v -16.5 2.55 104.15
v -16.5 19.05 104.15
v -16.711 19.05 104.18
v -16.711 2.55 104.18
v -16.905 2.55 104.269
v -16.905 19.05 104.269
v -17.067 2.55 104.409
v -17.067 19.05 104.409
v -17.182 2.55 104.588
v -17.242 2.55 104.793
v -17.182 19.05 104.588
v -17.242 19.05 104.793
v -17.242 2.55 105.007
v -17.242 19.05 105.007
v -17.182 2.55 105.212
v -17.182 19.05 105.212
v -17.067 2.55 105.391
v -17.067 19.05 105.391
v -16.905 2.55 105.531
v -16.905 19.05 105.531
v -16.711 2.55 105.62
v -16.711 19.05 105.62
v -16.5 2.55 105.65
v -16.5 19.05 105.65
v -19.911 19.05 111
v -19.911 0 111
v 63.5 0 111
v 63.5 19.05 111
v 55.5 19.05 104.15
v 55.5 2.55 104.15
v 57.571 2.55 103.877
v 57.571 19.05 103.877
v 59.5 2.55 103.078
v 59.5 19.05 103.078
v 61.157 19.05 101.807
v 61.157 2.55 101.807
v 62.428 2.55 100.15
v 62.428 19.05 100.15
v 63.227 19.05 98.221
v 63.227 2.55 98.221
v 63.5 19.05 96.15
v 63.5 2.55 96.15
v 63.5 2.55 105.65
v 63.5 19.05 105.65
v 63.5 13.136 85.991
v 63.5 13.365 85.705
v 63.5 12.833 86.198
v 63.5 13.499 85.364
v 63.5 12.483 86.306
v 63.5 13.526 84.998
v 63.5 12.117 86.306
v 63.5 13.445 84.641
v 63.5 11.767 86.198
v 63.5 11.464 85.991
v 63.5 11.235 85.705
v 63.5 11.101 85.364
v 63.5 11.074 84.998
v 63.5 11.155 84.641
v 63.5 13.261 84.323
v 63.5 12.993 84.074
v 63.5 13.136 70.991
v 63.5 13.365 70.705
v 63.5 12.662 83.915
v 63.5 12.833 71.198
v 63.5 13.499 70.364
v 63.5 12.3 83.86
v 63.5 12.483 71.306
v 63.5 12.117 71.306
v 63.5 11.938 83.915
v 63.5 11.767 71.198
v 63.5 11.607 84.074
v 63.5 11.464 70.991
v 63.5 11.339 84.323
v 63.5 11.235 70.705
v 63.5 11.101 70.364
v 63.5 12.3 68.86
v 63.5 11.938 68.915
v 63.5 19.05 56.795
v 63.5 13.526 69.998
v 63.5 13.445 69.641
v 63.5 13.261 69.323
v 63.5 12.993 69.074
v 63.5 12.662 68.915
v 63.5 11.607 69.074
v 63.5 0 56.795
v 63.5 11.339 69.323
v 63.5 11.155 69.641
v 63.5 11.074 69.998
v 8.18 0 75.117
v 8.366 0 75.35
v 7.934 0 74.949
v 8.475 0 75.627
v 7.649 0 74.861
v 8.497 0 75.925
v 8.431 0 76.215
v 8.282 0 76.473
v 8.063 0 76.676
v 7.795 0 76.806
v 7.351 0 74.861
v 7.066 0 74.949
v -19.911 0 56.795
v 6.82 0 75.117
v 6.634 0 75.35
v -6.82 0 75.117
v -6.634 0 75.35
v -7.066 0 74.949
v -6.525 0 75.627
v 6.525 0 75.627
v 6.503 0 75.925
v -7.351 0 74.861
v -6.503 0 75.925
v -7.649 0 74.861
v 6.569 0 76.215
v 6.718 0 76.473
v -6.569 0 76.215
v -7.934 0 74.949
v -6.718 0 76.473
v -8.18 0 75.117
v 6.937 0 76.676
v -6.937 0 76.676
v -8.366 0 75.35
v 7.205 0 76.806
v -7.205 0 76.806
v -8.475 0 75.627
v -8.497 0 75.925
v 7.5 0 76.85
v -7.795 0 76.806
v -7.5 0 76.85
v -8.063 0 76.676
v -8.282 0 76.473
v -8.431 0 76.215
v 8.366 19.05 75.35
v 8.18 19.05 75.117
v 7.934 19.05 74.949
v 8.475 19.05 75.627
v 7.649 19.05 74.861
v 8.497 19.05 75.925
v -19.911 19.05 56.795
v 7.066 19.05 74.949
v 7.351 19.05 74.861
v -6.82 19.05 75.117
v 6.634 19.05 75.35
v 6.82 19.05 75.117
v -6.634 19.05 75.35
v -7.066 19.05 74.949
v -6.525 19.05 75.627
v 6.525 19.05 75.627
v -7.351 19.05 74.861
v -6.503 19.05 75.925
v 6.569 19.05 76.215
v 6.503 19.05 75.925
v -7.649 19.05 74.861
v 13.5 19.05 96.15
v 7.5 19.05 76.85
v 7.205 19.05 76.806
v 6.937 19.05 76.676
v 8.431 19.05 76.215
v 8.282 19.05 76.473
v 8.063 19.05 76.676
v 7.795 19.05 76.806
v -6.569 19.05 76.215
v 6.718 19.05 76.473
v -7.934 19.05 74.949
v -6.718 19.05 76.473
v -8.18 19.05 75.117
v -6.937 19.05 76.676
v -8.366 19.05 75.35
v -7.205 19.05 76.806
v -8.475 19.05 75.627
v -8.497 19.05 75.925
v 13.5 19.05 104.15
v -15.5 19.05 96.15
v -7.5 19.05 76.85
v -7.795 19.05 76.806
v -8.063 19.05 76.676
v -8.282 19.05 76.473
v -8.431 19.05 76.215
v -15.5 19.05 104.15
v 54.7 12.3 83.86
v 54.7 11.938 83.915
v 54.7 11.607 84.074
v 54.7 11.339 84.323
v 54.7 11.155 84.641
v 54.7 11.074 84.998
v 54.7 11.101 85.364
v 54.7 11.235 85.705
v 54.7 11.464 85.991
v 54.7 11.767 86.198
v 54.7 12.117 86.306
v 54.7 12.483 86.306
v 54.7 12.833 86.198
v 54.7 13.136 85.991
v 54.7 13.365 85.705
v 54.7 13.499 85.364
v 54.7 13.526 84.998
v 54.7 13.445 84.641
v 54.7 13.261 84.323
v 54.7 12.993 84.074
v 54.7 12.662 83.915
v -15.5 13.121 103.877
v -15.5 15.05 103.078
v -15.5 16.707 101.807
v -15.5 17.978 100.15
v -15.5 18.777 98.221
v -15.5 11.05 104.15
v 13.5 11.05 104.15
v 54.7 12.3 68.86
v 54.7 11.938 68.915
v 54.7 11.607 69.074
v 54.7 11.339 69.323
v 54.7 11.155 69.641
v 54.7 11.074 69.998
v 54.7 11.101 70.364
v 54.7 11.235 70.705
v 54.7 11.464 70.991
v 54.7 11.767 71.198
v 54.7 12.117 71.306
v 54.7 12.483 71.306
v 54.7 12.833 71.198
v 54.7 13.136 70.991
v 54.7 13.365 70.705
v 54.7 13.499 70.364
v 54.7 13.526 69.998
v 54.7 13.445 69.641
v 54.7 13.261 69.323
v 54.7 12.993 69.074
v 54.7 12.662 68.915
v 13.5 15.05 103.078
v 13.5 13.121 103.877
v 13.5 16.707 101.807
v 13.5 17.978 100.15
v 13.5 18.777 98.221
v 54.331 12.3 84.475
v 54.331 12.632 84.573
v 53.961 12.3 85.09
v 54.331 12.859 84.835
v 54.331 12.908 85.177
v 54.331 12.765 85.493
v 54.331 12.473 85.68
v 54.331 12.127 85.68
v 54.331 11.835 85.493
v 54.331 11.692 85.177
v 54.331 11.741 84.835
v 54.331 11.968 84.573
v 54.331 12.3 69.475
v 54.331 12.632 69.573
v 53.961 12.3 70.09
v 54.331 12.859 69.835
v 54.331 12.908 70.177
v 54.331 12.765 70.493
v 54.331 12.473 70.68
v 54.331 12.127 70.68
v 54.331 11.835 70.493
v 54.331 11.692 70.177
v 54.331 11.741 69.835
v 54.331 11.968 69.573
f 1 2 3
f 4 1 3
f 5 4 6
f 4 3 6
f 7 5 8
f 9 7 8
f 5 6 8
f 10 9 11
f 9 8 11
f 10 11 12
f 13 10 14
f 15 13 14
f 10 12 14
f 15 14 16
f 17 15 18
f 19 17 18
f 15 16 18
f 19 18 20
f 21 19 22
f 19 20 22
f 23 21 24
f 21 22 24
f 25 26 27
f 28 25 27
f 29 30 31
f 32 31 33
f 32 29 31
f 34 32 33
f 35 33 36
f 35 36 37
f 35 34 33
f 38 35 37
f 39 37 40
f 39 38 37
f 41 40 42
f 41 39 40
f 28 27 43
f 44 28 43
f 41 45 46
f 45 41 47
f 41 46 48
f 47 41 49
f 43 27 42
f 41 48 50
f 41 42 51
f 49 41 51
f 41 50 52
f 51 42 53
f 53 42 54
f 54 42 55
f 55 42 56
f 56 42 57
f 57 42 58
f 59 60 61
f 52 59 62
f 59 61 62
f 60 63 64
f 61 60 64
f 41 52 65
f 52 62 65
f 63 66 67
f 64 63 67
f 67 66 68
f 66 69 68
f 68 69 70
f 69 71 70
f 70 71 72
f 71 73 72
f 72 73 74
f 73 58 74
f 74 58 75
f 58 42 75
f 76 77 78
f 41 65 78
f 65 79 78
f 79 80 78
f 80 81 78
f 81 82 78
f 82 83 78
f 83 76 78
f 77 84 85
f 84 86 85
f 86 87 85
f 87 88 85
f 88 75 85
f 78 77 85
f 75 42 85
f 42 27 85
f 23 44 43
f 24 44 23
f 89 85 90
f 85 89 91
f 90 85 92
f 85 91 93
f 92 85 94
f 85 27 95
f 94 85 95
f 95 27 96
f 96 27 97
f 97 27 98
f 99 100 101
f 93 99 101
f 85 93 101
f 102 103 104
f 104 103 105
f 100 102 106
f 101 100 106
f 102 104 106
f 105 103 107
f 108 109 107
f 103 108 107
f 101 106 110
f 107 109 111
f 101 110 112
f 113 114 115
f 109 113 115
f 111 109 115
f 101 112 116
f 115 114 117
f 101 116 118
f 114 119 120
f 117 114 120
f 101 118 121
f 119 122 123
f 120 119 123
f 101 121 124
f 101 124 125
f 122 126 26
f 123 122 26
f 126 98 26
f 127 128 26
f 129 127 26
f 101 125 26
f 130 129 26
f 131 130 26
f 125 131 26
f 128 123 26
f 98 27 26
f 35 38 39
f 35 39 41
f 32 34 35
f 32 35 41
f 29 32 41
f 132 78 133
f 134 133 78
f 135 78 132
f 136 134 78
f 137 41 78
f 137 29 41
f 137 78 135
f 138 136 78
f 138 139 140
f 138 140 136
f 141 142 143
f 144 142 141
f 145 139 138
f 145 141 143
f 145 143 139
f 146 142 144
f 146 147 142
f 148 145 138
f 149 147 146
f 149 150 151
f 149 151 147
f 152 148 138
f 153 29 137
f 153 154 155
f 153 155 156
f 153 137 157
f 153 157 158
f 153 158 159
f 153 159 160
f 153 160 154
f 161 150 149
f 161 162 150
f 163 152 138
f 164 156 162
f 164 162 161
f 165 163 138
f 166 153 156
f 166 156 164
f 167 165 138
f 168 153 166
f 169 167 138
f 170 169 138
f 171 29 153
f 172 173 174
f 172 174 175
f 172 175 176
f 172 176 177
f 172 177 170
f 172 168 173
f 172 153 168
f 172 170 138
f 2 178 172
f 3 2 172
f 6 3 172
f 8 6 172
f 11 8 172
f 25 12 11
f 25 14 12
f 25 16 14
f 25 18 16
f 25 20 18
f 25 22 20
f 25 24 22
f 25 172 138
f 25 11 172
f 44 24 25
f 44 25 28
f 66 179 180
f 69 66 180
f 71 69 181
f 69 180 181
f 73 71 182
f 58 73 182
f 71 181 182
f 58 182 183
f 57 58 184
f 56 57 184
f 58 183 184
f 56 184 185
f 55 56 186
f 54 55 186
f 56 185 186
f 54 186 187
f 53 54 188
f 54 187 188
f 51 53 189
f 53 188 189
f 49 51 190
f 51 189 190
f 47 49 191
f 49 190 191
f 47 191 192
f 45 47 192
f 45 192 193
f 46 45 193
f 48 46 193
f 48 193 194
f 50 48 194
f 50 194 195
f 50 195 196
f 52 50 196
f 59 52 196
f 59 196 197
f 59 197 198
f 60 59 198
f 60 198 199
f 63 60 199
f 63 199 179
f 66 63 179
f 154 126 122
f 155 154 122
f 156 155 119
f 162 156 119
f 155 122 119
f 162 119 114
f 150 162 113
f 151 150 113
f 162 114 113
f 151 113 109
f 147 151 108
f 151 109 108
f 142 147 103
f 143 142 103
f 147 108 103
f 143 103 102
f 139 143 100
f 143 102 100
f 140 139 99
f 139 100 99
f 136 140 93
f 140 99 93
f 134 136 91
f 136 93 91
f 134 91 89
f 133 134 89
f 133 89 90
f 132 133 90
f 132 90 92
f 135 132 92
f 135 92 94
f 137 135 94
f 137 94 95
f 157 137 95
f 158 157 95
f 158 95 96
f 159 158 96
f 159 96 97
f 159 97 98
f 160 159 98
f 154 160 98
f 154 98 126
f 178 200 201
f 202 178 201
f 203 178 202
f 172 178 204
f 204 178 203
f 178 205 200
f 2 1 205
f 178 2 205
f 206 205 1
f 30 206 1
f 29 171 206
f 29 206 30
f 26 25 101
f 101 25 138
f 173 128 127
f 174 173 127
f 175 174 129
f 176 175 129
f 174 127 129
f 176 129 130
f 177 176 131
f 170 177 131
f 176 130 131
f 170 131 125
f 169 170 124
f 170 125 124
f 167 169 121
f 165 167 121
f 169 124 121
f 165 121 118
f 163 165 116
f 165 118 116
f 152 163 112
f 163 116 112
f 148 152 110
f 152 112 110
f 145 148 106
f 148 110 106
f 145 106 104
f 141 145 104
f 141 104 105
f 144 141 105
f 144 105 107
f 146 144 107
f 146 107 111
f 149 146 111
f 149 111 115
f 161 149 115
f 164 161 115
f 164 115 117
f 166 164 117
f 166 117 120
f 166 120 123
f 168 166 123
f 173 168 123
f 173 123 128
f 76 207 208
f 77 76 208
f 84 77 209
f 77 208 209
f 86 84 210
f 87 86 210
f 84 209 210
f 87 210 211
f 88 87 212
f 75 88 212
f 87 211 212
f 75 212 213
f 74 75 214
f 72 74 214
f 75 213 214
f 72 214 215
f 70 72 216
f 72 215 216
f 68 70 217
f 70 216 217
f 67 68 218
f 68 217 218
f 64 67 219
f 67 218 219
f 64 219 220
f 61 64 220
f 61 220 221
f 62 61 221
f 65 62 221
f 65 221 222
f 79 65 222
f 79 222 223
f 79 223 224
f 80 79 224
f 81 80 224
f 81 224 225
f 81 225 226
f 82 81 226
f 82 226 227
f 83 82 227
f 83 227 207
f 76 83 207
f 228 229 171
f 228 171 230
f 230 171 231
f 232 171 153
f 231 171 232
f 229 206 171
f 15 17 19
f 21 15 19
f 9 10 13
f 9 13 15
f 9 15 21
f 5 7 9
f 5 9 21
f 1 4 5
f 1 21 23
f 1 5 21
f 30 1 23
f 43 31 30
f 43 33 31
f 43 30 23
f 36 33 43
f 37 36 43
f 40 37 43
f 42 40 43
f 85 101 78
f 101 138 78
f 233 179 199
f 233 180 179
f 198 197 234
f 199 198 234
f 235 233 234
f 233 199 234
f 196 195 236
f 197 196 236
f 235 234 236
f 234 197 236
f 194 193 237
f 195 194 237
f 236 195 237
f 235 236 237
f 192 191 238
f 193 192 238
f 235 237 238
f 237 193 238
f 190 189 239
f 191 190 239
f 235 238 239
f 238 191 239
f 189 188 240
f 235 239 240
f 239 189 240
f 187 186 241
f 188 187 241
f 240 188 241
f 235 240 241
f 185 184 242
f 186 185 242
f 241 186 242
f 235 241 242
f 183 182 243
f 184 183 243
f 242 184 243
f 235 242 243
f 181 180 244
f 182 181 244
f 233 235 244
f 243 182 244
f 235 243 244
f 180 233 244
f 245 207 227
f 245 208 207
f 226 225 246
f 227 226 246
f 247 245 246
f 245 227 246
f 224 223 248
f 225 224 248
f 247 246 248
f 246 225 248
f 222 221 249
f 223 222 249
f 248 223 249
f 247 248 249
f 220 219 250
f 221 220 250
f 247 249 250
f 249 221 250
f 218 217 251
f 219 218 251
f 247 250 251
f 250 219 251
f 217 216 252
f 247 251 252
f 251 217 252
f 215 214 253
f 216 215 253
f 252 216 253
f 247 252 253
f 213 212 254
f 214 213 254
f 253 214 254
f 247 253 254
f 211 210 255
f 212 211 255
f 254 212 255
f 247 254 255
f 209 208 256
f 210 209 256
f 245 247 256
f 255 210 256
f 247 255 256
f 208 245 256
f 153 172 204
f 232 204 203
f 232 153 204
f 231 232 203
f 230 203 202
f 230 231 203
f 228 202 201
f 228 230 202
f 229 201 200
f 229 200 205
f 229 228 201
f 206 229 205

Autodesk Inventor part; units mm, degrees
ref_plane "YZ Plane" through (0, 0, 0) normal (1, 0, 0) x (0, 1, 0)
ref_plane "XZ Plane" through (0, 0, 0) normal (0, 1, 0) x (-1, 0, 0)
ref_plane "XY Plane" through (0, 0, 0) normal (0, 0, 1) x (1, 0, 0)
sketch "Sketch1" plane through (0, 0, 0) normal (0, 1, 0) x (-1, 0, 0)
  line L0 (-63.5, -111) -> (63.5, -111)
  line L1 (63.5, -111) -> (63.5, 111)
  line L2 (63.5, 111) -> (-63.5, 111)
  line L3 (-63.5, 111) -> (-63.5, -111)
  line L4 (-63.5, -111) -> (63.5, 111) construction
  line L5 (63.5, -111) -> (-63.5, 111) construction
  point P0 (0, 0)
  dimension "d0" = 127
  dimension "d1" = 222
extrude "Extrusion1" add sketch "Sketch1" along normal blind 19.05
sketch "Sketch12" plane through (0, 19.05, 0) normal (0, 1, 0) x (1, 0, 0)
  line L0 (63.5, -111) -> (63.5, 111) projected
  line L1 (-16.5, -104.15) -> (63.5, -104.15)
  line L2 (63.5, -104.15) -> (63.5, -105.65)
  line L3 (63.5, -105.65) -> (-16.5, -105.65)
  circle A0 centre (33, -60.25) radius 1.2295 projected
  circle A1 centre (33, -47.45) radius 1.2295 projected
  arc A2 (-16.5, -104.15) -> (-16.5, -105.65) centre (-16.5, -104.9) ccw
  circle A3 centre (-33, -9.45) radius 1.2295 projected
  circle A4 centre (-33, -60.25) radius 1.2295 projected
  circle A5 centre (33, -98.25) radius 1.2295 projected
  line L4 (-16.5, -53.35) -> (63.5, -53.35)
  line L5 (63.5, -53.35) -> (63.5, -54.85)
  line L6 (63.5, -54.85) -> (-16.5, -54.85)
  arc A6 (-16.5, -53.35) -> (-16.5, -54.85) centre (-16.5, -54.1) ccw
  line L7 (-16.5, -2.55) -> (63.5, -2.55)
  line L8 (63.5, -2.55) -> (63.5, -4.05)
  line L9 (63.5, -4.05) -> (-16.5, -4.05)
  arc A7 (-16.5, -2.55) -> (-16.5, -4.05) centre (-16.5, -3.3) ccw
  line L10 (-16.5, 48.25) -> (63.5, 48.25)
  line L11 (63.5, 48.25) -> (63.5, 46.75)
  line L12 (63.5, 46.75) -> (-16.5, 46.75)
  arc A8 (-16.5, 48.25) -> (-16.5, 46.75) centre (-16.5, 47.5) ccw
  point P0 (0, 0)
  point P1 (63.5, -60.2)
  point P2 (63.5, -9.4)
  point P3 (63.5, 41.4)
  dimension "d156" = 1.5
  dimension "d157" = 12.8
  dimension "d159" = 0.75
  dimension "d160" = 80
  dimension "d161" = 50.8
  dimension "d162" = 5.9
  dimension "d165" = 50.8
extrude "Extrusion7" cut sketch "Sketch12" against normal blind 16.5 contours L3 A2 L1 L0 | L6 A6 L4 L0 | L9 A7 L7 L0 | L12 A8 L10 L0
sketch "Sketch13" plane through (63.5, 0, 111) normal (1, 0, 0) x (0, 0, -1)
  line L0 (0, 0) -> (222, 0) projected
  line L1 (0, 0) -> (0, 19.05) projected
  line L2 (56.15, 2.55) -> (56.15, 19.05) projected
  line L3 (5.35, 2.55) -> (5.35, 19.05) projected
  point P0 (111, 0)
  point P1 (25.91, 12.3)
  point P2 (40.91, 12.3)
  point P3 (0, 17.05)
  point P4 (56.65, 17.05)
  point P5 (5.85, 17.05)
  point P6 (76.71, 12.3)
  point P7 (91.71, 12.3)
  point P8 (127.51, 12.3)
  point P9 (142.51, 12.3)
  point P10 (178.31, 12.3)
  point P11 (193.31, 12.3)
  point P12 (56.15, 19.05)
  point P13 (5.35, 19.05)
  dimension "d176" = 50.8
  dimension "d173" = 12.3
  dimension "d174" = 15
  dimension "d175" = 25.91
  dimension "d179" = 50.8
hole "Hole7" at (63.5, 12.3, 85.09) at (63.5, 12.3, 70.09) at (63.5, 12.3, 34.29) at (63.5, 12.3, 19.29) at (63.5, 12.3, -16.51) at (63.5, 12.3, -31.51) at (63.5, 12.3, -67.31) at (63.5, 12.3, -82.31) direction (-1, 0, 0) diameter 2.459 depth 8.8 tip angle 118 thread size "M3x0.5" class "6H" standard "ANSI Metric M Profile"
sketch "Sketch14" plane through (63.5, 0, 111) normal (1, 0, 0) x (0, 0, -1)
  line L0 (6.85, 19.05) -> (6.85, 2.55) projected
  arc A0 (14.85, 19.05) -> (6.85, 11.05) centre (14.85, 11.05) ccw
  line L1 (14.85, 11.05) -> (14.85, 19.05) construction
  line L2 (14.85, 11.05) -> (6.85, 11.05) construction
  line L3 (6.85, 19.05) -> (56.15, 19.05) projected
  line L4 (14.85, 19.05) -> (6.85, 19.05)
  line L5 (6.85, 19.05) -> (6.85, 11.05)
  arc A1 (65.65, 19.05) -> (57.65, 11.05) centre (65.65, 11.05) ccw
  line L6 (65.65, 19.05) -> (57.65, 19.05)
  line L7 (57.65, 19.05) -> (57.65, 11.05)
  arc A2 (116.45, 19.05) -> (108.45, 11.05) centre (116.45, 11.05) ccw
  line L8 (116.45, 19.05) -> (108.45, 19.05)
  line L9 (108.45, 19.05) -> (108.45, 11.05)
  arc A3 (167.25, 19.05) -> (159.25, 11.05) centre (167.25, 11.05) ccw
  line L10 (167.25, 19.05) -> (159.25, 19.05)
  line L11 (159.25, 19.05) -> (159.25, 11.05)
  point P0 (111, 0)
  dimension "d191" = 90
  dimension "d192" = 8
  dimension "d193" = 8
  dimension "d198" = 50.8
extrude "Extrusion8" cut sketch "Sketch14" against normal blind 79
extrude "Extrusion10" add sketch "Sketch14" against normal blind 50
sketch "Sketch15" plane through (0, 19.05, 0) normal (0, 1, 0) x (1, 0, 0)
  arc A0 (55.5, -104.15) -> (63.5, -96.15) centre (55.5, -96.15) ccw
  line L0 (55.5, -96.15) -> (55.5, -104.15) construction
  line L1 (55.5, -96.15) -> (63.5, -96.15) construction
  line L2 (-15.5, -104.15) -> (63.5, -104.15) projected
  line L3 (63.5, -96.15) -> (63.5, -54.85) projected
  line L4 (-16.5, -104.15) -> (63.5, -104.15) projected
  line L5 (55.5, -104.15) -> (63.5, -104.15)
  line L6 (63.5, -104.15) -> (63.5, -96.15)
  arc A1 (55.5, -53.35) -> (63.5, -45.35) centre (55.5, -45.35) ccw
  line L7 (63.5, -53.35) -> (63.5, -45.35)
  line L8 (55.5, -53.35) -> (63.5, -53.35)
  arc A2 (55.5, -2.55) -> (63.5, 5.45) centre (55.5, 5.45) ccw
  line L9 (63.5, -2.55) -> (63.5, 5.45)
  line L10 (55.5, -2.55) -> (63.5, -2.55)
  arc A3 (55.5, 48.25) -> (63.5, 56.25) centre (55.5, 56.25) ccw
  line L11 (63.5, 48.25) -> (63.5, 56.25)
  line L12 (55.5, 48.25) -> (63.5, 48.25)
  point P0 (0, 0)
  point P1 (63.5, 56.25)
  point P2 (63.5, 5.45)
  dimension "d203" = 90
  dimension "d204" = 8
  dimension "d207" = 50.8
extrude "Extrusion9" cut sketch "Sketch15" against normal up to surface (16.5 mm away)
sketch "Sketch16" plane through (0, 19.05, 0) normal (0, 1, 0) x (1, 0, 0)
  line L0 (-15.5, -96.15) -> (13.5, -96.15) projected
  line L1 (13.5, -104.15) -> (13.5, -96.15) projected
  point P0 (0, 0)
  point P1 (7.5, -75.85)
  point P2 (-7.5, -75.85)
  point P3 (-16.5, -96.15)
  point P4 (-7.5, -25.05)
  point P5 (7.5, -25.05)
  point P6 (-7.5, 25.75)
  point P7 (7.5, 25.75)
  point P8 (-7.5, 76.55)
  point P9 (7.5, 76.55)
  dimension "d216" = 20.3
  dimension "d217" = 15
  dimension "d218" = 6
  dimension "d221" = 50.8
hole "Hole8" at (-7.5, 19.05, 25.05) at (-7.5, 19.05, -25.75) at (7.5, 19.05, -25.75) at (-7.5, 19.05, -76.55) at (7.5, 19.05, -76.55) at (7.5, 19.05, 75.85) at (-7.5, 19.05, 75.85) at (7.5, 19.05, 25.05) direction (0, -1, 0) diameter 2 end through all
sketch "Sketch17" plane through (0, 19.05, 0) normal (0, 1, 0) x (1, 0, 0)
  line L0 (63.5, -111) -> (63.5, 111) projected
  line L1 (63.5, -111) -> (-19.9113, -111)
  line L2 (-19.9113, -111) -> (-19.9113, -56.7947)
  line L3 (-19.9113, -56.7947) -> (63.5, -56.7947)
  line L4 (63.5, -56.7947) -> (63.5, -111)
  line L5 (-63.5, 111) -> (-63.5, -111) projected
  line L6 (-19.9113, -111) -> (-63.5, -111)
  line L7 (-63.5, -111) -> (-63.5, 111)
  line L8 (-63.5, 111) -> (63.5, 111)
  point P0 (0, 0)
extrude "Extrusion11" cut sketch "Sketch17" against normal through all contours L3 L2 L6 L5 L8 L0
properties part number "Tamale Assembly Plate FLEX V1 Print Section"
